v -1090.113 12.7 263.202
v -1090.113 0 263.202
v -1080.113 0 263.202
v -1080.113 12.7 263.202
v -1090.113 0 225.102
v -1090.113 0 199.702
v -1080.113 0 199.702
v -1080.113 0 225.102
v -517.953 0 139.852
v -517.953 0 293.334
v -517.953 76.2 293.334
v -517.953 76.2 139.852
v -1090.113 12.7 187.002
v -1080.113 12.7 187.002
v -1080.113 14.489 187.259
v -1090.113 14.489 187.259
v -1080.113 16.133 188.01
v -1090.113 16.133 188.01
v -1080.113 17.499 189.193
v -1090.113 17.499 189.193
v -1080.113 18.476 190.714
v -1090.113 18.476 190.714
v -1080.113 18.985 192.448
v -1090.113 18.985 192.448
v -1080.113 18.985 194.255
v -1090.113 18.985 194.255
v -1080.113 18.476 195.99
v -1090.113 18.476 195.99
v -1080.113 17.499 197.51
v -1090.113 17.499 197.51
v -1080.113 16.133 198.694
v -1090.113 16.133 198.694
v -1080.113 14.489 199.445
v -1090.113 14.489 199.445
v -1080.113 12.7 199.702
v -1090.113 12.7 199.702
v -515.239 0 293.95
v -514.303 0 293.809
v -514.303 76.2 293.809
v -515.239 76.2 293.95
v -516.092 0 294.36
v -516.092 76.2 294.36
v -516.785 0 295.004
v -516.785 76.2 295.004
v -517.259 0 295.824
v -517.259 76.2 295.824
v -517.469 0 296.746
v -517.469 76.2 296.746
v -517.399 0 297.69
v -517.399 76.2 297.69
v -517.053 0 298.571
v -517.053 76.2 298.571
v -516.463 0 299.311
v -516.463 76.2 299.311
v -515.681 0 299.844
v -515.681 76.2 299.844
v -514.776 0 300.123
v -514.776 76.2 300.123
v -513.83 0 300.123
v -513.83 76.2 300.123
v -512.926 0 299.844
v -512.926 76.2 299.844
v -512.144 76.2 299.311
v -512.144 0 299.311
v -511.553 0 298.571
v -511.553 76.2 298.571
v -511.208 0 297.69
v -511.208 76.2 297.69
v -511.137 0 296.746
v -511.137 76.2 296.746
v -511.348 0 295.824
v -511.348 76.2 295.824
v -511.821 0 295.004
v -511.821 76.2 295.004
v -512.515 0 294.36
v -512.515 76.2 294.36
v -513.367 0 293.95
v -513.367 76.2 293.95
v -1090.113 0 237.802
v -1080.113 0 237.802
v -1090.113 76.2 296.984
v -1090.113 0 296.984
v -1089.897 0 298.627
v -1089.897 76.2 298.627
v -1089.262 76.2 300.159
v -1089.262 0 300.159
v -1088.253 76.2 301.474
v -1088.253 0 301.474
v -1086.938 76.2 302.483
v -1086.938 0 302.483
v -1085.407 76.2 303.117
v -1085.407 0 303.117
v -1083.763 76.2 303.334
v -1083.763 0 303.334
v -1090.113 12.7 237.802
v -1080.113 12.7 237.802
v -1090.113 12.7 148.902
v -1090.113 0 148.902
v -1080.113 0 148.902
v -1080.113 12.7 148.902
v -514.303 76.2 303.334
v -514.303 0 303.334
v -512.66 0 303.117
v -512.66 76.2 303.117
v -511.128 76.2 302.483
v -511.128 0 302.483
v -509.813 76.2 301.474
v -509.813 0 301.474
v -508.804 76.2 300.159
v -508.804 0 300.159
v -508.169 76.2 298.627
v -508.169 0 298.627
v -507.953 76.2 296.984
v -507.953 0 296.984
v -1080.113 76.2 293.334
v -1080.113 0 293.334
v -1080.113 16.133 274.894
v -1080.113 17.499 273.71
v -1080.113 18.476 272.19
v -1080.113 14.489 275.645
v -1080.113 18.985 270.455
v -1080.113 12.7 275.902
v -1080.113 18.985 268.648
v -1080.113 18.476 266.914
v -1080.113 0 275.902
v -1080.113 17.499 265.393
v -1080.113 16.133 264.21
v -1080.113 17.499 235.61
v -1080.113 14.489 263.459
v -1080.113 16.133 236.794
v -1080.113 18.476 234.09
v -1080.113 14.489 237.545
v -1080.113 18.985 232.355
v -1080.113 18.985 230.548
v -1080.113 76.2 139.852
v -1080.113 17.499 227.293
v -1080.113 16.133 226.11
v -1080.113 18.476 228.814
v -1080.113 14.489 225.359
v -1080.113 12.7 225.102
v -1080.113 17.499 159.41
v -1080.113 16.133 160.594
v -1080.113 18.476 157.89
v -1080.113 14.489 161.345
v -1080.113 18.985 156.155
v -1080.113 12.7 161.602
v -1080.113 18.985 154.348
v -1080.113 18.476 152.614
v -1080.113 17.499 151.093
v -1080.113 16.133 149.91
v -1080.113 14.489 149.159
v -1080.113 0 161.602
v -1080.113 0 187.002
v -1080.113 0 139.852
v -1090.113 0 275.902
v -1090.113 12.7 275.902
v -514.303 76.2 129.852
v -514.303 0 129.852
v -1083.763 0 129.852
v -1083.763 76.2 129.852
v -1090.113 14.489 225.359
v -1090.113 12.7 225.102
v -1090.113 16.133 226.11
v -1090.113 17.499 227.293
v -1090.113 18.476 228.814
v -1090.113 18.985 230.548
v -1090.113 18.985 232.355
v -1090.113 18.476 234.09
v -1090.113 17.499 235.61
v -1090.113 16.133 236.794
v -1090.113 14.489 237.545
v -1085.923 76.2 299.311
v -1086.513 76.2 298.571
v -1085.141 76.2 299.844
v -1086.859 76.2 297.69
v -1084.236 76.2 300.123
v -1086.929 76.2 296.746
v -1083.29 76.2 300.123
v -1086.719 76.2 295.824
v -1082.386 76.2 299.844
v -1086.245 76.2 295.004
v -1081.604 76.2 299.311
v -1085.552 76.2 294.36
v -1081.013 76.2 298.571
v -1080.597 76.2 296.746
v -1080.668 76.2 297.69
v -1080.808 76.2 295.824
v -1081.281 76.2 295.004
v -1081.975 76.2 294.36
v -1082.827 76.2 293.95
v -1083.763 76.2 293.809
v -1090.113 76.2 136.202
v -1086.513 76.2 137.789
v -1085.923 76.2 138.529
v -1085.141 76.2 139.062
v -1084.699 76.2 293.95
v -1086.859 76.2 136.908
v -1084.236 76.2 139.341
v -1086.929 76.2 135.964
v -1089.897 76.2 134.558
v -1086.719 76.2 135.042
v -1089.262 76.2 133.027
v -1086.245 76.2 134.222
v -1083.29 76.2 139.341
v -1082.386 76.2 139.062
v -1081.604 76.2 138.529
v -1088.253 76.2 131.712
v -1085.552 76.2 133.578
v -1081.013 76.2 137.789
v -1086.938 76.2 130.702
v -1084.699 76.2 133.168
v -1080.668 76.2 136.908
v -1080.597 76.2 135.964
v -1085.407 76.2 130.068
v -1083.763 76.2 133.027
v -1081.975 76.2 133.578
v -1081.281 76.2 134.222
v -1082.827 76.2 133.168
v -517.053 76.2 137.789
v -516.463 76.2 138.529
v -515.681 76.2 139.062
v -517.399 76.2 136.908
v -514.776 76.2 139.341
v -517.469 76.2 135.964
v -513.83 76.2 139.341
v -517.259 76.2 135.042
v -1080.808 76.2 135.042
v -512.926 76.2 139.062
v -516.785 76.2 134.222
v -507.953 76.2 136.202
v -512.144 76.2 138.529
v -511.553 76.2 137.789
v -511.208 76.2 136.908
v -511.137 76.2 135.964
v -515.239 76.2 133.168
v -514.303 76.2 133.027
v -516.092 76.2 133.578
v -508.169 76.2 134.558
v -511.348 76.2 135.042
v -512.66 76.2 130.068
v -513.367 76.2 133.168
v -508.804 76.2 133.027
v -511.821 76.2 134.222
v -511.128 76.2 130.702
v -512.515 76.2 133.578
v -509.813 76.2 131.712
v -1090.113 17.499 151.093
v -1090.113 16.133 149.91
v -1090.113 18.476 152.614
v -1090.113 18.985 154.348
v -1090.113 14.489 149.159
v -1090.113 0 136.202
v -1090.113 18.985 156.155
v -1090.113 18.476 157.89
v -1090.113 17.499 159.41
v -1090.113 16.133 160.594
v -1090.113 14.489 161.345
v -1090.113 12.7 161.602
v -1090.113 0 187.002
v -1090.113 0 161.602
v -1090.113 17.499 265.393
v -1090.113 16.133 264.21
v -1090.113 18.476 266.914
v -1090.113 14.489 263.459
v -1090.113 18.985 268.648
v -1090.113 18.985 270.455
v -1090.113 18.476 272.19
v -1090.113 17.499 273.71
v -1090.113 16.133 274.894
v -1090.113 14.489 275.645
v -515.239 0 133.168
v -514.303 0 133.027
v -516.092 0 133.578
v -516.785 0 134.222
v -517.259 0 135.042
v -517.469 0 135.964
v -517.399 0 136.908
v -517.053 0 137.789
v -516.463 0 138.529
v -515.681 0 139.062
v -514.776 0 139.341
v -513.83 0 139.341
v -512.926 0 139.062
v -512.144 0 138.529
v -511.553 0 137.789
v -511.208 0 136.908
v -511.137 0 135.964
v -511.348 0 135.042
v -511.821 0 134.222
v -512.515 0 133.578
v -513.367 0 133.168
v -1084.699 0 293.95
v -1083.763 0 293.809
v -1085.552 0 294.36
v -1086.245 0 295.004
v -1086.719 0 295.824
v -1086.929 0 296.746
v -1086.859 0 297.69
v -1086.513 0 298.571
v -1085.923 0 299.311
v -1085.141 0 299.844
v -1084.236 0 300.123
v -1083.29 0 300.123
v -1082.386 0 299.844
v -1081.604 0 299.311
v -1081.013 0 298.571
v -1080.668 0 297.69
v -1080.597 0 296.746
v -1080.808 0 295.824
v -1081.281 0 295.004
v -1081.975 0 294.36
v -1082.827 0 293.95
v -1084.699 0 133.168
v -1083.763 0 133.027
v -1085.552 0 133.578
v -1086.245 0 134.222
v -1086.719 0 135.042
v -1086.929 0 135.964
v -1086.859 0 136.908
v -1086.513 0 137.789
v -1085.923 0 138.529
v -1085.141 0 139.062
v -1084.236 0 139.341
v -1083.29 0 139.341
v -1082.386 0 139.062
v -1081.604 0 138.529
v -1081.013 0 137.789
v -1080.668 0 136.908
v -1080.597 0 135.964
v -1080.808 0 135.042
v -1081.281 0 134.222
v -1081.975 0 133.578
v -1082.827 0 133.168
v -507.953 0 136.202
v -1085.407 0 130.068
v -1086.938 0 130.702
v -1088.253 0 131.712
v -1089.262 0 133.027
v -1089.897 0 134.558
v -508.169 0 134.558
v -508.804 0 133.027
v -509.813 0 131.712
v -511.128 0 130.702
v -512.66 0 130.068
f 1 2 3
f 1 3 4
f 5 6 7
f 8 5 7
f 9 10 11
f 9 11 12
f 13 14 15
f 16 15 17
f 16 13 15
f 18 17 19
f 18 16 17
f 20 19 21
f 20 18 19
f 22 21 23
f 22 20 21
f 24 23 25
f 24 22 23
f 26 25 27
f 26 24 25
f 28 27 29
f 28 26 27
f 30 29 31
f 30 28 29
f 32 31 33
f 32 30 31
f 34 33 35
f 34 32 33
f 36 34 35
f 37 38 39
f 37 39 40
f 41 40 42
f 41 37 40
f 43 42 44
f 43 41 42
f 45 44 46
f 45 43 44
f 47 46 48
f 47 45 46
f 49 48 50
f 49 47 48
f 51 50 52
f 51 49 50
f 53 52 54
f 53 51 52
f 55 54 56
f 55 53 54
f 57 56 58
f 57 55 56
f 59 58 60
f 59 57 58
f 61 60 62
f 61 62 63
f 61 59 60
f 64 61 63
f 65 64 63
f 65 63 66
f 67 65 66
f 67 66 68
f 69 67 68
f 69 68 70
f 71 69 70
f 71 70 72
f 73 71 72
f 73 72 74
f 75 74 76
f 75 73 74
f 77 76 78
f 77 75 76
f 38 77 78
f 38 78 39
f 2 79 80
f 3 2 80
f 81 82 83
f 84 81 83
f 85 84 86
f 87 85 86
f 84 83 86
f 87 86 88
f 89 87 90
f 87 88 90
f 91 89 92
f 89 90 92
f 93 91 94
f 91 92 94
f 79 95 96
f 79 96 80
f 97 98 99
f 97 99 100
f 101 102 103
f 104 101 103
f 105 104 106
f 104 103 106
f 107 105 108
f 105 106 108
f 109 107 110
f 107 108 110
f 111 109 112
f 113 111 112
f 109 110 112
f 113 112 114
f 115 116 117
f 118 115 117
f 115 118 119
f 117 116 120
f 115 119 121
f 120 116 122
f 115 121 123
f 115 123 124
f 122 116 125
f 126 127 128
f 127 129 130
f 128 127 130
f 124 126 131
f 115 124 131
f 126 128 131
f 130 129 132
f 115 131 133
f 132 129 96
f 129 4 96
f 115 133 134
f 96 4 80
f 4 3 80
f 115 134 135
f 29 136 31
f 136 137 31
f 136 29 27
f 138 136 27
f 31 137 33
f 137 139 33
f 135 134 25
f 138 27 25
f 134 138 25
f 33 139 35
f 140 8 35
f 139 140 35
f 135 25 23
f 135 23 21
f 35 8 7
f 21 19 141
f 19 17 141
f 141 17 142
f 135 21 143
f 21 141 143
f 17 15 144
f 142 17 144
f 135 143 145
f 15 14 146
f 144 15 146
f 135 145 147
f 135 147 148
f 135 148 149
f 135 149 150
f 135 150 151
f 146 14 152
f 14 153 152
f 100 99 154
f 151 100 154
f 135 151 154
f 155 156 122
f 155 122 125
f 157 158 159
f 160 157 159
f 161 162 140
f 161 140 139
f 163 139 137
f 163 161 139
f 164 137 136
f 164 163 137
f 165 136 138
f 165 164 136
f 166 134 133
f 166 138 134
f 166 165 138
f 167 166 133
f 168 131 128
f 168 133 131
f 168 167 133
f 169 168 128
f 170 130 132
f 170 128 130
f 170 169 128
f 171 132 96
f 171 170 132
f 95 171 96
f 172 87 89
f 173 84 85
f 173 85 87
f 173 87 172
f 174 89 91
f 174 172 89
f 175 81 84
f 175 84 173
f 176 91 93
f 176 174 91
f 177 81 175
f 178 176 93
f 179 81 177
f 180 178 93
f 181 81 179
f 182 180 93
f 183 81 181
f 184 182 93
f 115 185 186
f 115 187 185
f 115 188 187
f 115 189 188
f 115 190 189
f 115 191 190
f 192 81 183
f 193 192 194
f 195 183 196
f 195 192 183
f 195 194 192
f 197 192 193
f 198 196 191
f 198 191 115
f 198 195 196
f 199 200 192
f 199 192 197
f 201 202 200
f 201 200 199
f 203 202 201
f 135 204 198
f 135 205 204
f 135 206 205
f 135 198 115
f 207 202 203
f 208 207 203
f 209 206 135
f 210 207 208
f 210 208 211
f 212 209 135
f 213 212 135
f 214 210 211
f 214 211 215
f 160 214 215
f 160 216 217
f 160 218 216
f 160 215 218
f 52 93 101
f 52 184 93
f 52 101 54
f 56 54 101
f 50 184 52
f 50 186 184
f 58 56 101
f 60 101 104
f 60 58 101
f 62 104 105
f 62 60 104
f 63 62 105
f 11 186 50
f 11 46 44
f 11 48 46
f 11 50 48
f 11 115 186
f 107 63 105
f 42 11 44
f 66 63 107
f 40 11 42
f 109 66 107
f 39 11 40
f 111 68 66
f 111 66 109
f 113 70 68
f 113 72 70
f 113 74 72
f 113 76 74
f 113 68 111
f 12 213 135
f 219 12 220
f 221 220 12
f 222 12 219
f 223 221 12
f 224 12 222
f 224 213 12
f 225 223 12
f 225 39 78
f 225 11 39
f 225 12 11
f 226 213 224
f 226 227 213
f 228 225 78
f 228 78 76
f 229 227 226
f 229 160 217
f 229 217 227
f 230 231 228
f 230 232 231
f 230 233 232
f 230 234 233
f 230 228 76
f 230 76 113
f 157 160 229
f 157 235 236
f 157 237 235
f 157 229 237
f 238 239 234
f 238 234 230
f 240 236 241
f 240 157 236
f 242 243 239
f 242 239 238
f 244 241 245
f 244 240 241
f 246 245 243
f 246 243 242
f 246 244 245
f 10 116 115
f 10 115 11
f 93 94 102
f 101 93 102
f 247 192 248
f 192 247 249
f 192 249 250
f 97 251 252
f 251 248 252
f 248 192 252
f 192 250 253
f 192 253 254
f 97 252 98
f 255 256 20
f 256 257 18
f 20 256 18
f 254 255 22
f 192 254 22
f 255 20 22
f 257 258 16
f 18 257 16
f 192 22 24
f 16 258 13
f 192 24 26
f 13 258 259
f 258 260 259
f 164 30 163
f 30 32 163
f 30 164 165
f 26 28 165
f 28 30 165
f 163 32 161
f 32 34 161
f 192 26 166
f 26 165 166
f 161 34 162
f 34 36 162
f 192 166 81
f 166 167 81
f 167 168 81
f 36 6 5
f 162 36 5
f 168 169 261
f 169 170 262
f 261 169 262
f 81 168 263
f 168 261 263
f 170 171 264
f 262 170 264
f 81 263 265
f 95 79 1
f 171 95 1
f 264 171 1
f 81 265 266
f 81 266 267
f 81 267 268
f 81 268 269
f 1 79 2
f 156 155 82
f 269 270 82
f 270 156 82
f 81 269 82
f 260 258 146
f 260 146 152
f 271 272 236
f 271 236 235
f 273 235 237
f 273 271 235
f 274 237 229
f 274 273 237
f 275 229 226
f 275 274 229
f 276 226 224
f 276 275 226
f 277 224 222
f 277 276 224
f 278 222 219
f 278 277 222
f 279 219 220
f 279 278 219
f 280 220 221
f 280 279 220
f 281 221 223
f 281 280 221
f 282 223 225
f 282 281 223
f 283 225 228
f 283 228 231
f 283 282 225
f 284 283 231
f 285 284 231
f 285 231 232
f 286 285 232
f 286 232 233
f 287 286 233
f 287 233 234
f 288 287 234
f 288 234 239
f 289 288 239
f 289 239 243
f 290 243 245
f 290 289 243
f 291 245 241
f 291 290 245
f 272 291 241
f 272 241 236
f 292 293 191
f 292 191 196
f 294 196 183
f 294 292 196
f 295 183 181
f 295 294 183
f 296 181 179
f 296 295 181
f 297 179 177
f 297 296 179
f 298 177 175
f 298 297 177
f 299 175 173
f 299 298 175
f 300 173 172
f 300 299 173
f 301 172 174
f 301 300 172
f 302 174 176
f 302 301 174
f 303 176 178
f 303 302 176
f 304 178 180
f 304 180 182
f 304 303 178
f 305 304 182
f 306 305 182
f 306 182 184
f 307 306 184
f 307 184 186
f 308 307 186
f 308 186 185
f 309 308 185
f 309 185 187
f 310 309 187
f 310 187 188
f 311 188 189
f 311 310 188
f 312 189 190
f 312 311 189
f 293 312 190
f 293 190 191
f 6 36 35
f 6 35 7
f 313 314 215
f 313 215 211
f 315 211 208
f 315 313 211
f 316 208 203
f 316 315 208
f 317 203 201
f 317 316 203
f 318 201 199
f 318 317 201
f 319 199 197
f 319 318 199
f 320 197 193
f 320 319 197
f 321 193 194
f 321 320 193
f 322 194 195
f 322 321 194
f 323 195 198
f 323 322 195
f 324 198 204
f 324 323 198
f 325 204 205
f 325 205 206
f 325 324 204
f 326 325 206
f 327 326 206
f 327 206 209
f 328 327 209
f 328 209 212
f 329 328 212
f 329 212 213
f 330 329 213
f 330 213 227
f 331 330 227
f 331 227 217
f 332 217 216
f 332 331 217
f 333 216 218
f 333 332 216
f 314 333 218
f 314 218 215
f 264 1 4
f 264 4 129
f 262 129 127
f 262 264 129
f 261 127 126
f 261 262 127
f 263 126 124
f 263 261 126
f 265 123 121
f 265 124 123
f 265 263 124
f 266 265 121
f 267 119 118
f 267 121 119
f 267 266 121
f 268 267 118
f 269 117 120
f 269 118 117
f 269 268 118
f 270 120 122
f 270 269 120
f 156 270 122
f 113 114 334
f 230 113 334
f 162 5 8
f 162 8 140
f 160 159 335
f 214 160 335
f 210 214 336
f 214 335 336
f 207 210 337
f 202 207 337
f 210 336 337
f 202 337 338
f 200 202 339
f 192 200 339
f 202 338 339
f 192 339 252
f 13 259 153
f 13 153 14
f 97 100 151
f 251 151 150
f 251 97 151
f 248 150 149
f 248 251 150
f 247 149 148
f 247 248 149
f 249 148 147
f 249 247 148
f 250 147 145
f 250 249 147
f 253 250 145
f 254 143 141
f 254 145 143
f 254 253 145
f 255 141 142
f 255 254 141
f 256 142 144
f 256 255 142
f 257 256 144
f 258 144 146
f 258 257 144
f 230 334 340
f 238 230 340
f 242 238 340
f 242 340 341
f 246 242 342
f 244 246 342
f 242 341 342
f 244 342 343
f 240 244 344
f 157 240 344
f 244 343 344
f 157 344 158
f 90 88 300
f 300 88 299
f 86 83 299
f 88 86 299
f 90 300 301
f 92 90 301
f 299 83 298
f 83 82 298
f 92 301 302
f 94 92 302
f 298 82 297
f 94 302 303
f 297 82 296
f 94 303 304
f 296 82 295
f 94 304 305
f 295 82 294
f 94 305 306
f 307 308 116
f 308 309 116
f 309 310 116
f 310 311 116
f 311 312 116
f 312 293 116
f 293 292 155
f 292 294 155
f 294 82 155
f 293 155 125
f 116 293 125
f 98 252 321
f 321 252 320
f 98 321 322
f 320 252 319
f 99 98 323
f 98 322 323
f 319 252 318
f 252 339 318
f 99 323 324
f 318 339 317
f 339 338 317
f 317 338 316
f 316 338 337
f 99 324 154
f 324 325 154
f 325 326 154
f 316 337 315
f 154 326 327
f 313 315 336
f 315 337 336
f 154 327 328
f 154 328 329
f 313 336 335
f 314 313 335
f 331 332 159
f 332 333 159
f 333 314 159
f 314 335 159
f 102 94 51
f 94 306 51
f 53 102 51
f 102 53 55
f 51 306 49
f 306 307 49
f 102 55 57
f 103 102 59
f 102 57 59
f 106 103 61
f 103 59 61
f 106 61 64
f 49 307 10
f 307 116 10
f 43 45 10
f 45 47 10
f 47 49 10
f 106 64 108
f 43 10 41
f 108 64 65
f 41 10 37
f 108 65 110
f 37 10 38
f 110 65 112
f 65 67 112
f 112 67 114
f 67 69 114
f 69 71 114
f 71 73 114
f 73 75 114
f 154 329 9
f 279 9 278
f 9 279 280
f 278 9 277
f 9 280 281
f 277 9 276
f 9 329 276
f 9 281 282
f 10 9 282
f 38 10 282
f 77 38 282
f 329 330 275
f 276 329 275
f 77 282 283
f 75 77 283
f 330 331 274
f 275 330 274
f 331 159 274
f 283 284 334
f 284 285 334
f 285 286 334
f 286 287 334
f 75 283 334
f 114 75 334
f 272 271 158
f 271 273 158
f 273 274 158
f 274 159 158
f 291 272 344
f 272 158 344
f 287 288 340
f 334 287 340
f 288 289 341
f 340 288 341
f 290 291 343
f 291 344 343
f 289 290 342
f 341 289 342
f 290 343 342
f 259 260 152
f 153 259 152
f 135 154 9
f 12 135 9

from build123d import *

# Parameters (mm, degrees)
SKETCH1_R           = 3.175
SKETCH1_W           = 562.160000372
SKETCH1_H           = 153.482
BOSS_EXTRUDE1_DEPTH = 76.2
CUT_EXTRUDE1_REACH  = 662.854


with BuildPart() as part:
    # Sketch1 → Boss-Extrude1 (new body)
    with BuildSketch(Plane(origin=(0, 0, 0), x_dir=(1, 0, 0), z_dir=(0, 1, 0))):
        with BuildLine():
            Line((-514.30312852, -129.851740003), (-1083.763128892, -129.851740003))
            ThreePointArc((-1083.763128892, -129.851740003), (-1088.253256953, -131.711611942), (-1090.113128892, -136.201740003))
            Line((-1090.113128892, -136.201740003), (-1090.113128892, -296.983740003))
            ThreePointArc((-1090.113128892, -296.983740003), (-1088.253256953, -301.473868063), (-1083.763128892, -303.333740003))
            Line((-1083.763128892, -303.333740003), (-514.30312852, -303.333740003))
            ThreePointArc((-514.30312852, -303.333740003), (-509.81300046, -301.473868063), (-507.95312852, -296.983740003))
            Line((-507.95312852, -296.983740003), (-507.95312852, -136.201740003))
            ThreePointArc((-507.95312852, -136.201740003), (-509.81300046, -131.711611942), (-514.30312852, -129.851740003))
        make_face()
        with Locations(Location((-1083.763128892, -136.201740003, 0), (0, 0, 90))):
            Circle(SKETCH1_R, mode=Mode.SUBTRACT)
        with Locations(Location((-1083.763128892, -296.983740003, 0), (0, 0, 90))):
            Circle(SKETCH1_R, mode=Mode.SUBTRACT)
        with Locations(Location((-514.30312852, -136.201740003, 0), (0, 0, 90))):
            Circle(SKETCH1_R, mode=Mode.SUBTRACT)
        with Locations(Location((-514.30312852, -296.983740003, 0), (0, 0, 90))):
            Circle(SKETCH1_R, mode=Mode.SUBTRACT)
        with Locations((-799.033128706, -216.592740003)):
            Rectangle(SKETCH1_W, SKETCH1_H, mode=Mode.SUBTRACT)
    extrude(amount=BOSS_EXTRUDE1_DEPTH)

    # Sketch3 → Cut-Extrude1 (cut, up to next)
    with BuildSketch(Plane.ZY.offset(1090.113128892), mode=Mode.PRIVATE) as cut_extrude1_sk1:
        with BuildLine():
            Line((161.601740003, 0), (148.901740003, 0))
            Line((148.901740003, 0), (148.901740003, 12.7))
            ThreePointArc((148.901740003, 12.7), (155.251740003, 19.05), (161.601740003, 12.7))
            Line((161.601740003, 12.7), (161.601740003, 0))
        make_face()
    cut_extrude1_tool1 = extrude(cut_extrude1_sk1.sketch, amount=-CUT_EXTRUDE1_REACH, mode=Mode.PRIVATE) & part.part
    # Sketch3 → Cut-Extrude1 (cut, up to next)
    with BuildSketch(Plane.ZY.offset(1090.113128892), mode=Mode.PRIVATE) as cut_extrude1_sk2:
        with BuildLine():
            Line((199.701740003, 0), (187.001740003, 0))
            Line((187.001740003, 0), (187.001740003, 12.7))
            ThreePointArc((187.001740003, 12.7), (193.351740003, 19.05), (199.701740003, 12.7))
            Line((199.701740003, 12.7), (199.701740003, 0))
        make_face()
    cut_extrude1_tool2 = extrude(cut_extrude1_sk2.sketch, amount=-CUT_EXTRUDE1_REACH, mode=Mode.PRIVATE) & part.part
    # Sketch3 → Cut-Extrude1 (cut, up to next)
    with BuildSketch(Plane.ZY.offset(1090.113128892), mode=Mode.PRIVATE) as cut_extrude1_sk3:
        with BuildLine():
            Line((237.801740003, 0), (225.101740003, 0))
            Line((225.101740003, 0), (225.101740003, 12.7))
            ThreePointArc((225.101740003, 12.7), (231.451740003, 19.05), (237.801740003, 12.7))
            Line((237.801740003, 12.7), (237.801740003, 0))
        make_face()
    cut_extrude1_tool3 = extrude(cut_extrude1_sk3.sketch, amount=-CUT_EXTRUDE1_REACH, mode=Mode.PRIVATE) & part.part
    # Sketch3 → Cut-Extrude1 (cut, up to next)
    with BuildSketch(Plane.ZY.offset(1090.113128892), mode=Mode.PRIVATE) as cut_extrude1_sk4:
        with BuildLine():
            Line((275.901740003, 0), (263.201740003, 0))
            Line((263.201740003, 0), (263.201740003, 12.7))
            ThreePointArc((263.201740003, 12.7), (269.551740003, 19.05), (275.901740003, 12.7))
            Line((275.901740003, 12.7), (275.901740003, 0))
        make_face()
    cut_extrude1_tool4 = extrude(cut_extrude1_sk4.sketch, amount=-CUT_EXTRUDE1_REACH, mode=Mode.PRIVATE) & part.part
    add(cut_extrude1_tool1.solids().sort_by_distance((-1090.113129, 8.900424, 155.25174))[0], mode=Mode.SUBTRACT)
    add(cut_extrude1_tool2.solids().sort_by_distance((-1090.113129, 8.900424, 193.35174))[0], mode=Mode.SUBTRACT)
    add(cut_extrude1_tool3.solids().sort_by_distance((-1090.113129, 8.900424, 231.45174))[0], mode=Mode.SUBTRACT)
    add(cut_extrude1_tool4.solids().sort_by_distance((-1090.113129, 8.900424, 269.55174))[0], mode=Mode.SUBTRACT)


solid = part.part
